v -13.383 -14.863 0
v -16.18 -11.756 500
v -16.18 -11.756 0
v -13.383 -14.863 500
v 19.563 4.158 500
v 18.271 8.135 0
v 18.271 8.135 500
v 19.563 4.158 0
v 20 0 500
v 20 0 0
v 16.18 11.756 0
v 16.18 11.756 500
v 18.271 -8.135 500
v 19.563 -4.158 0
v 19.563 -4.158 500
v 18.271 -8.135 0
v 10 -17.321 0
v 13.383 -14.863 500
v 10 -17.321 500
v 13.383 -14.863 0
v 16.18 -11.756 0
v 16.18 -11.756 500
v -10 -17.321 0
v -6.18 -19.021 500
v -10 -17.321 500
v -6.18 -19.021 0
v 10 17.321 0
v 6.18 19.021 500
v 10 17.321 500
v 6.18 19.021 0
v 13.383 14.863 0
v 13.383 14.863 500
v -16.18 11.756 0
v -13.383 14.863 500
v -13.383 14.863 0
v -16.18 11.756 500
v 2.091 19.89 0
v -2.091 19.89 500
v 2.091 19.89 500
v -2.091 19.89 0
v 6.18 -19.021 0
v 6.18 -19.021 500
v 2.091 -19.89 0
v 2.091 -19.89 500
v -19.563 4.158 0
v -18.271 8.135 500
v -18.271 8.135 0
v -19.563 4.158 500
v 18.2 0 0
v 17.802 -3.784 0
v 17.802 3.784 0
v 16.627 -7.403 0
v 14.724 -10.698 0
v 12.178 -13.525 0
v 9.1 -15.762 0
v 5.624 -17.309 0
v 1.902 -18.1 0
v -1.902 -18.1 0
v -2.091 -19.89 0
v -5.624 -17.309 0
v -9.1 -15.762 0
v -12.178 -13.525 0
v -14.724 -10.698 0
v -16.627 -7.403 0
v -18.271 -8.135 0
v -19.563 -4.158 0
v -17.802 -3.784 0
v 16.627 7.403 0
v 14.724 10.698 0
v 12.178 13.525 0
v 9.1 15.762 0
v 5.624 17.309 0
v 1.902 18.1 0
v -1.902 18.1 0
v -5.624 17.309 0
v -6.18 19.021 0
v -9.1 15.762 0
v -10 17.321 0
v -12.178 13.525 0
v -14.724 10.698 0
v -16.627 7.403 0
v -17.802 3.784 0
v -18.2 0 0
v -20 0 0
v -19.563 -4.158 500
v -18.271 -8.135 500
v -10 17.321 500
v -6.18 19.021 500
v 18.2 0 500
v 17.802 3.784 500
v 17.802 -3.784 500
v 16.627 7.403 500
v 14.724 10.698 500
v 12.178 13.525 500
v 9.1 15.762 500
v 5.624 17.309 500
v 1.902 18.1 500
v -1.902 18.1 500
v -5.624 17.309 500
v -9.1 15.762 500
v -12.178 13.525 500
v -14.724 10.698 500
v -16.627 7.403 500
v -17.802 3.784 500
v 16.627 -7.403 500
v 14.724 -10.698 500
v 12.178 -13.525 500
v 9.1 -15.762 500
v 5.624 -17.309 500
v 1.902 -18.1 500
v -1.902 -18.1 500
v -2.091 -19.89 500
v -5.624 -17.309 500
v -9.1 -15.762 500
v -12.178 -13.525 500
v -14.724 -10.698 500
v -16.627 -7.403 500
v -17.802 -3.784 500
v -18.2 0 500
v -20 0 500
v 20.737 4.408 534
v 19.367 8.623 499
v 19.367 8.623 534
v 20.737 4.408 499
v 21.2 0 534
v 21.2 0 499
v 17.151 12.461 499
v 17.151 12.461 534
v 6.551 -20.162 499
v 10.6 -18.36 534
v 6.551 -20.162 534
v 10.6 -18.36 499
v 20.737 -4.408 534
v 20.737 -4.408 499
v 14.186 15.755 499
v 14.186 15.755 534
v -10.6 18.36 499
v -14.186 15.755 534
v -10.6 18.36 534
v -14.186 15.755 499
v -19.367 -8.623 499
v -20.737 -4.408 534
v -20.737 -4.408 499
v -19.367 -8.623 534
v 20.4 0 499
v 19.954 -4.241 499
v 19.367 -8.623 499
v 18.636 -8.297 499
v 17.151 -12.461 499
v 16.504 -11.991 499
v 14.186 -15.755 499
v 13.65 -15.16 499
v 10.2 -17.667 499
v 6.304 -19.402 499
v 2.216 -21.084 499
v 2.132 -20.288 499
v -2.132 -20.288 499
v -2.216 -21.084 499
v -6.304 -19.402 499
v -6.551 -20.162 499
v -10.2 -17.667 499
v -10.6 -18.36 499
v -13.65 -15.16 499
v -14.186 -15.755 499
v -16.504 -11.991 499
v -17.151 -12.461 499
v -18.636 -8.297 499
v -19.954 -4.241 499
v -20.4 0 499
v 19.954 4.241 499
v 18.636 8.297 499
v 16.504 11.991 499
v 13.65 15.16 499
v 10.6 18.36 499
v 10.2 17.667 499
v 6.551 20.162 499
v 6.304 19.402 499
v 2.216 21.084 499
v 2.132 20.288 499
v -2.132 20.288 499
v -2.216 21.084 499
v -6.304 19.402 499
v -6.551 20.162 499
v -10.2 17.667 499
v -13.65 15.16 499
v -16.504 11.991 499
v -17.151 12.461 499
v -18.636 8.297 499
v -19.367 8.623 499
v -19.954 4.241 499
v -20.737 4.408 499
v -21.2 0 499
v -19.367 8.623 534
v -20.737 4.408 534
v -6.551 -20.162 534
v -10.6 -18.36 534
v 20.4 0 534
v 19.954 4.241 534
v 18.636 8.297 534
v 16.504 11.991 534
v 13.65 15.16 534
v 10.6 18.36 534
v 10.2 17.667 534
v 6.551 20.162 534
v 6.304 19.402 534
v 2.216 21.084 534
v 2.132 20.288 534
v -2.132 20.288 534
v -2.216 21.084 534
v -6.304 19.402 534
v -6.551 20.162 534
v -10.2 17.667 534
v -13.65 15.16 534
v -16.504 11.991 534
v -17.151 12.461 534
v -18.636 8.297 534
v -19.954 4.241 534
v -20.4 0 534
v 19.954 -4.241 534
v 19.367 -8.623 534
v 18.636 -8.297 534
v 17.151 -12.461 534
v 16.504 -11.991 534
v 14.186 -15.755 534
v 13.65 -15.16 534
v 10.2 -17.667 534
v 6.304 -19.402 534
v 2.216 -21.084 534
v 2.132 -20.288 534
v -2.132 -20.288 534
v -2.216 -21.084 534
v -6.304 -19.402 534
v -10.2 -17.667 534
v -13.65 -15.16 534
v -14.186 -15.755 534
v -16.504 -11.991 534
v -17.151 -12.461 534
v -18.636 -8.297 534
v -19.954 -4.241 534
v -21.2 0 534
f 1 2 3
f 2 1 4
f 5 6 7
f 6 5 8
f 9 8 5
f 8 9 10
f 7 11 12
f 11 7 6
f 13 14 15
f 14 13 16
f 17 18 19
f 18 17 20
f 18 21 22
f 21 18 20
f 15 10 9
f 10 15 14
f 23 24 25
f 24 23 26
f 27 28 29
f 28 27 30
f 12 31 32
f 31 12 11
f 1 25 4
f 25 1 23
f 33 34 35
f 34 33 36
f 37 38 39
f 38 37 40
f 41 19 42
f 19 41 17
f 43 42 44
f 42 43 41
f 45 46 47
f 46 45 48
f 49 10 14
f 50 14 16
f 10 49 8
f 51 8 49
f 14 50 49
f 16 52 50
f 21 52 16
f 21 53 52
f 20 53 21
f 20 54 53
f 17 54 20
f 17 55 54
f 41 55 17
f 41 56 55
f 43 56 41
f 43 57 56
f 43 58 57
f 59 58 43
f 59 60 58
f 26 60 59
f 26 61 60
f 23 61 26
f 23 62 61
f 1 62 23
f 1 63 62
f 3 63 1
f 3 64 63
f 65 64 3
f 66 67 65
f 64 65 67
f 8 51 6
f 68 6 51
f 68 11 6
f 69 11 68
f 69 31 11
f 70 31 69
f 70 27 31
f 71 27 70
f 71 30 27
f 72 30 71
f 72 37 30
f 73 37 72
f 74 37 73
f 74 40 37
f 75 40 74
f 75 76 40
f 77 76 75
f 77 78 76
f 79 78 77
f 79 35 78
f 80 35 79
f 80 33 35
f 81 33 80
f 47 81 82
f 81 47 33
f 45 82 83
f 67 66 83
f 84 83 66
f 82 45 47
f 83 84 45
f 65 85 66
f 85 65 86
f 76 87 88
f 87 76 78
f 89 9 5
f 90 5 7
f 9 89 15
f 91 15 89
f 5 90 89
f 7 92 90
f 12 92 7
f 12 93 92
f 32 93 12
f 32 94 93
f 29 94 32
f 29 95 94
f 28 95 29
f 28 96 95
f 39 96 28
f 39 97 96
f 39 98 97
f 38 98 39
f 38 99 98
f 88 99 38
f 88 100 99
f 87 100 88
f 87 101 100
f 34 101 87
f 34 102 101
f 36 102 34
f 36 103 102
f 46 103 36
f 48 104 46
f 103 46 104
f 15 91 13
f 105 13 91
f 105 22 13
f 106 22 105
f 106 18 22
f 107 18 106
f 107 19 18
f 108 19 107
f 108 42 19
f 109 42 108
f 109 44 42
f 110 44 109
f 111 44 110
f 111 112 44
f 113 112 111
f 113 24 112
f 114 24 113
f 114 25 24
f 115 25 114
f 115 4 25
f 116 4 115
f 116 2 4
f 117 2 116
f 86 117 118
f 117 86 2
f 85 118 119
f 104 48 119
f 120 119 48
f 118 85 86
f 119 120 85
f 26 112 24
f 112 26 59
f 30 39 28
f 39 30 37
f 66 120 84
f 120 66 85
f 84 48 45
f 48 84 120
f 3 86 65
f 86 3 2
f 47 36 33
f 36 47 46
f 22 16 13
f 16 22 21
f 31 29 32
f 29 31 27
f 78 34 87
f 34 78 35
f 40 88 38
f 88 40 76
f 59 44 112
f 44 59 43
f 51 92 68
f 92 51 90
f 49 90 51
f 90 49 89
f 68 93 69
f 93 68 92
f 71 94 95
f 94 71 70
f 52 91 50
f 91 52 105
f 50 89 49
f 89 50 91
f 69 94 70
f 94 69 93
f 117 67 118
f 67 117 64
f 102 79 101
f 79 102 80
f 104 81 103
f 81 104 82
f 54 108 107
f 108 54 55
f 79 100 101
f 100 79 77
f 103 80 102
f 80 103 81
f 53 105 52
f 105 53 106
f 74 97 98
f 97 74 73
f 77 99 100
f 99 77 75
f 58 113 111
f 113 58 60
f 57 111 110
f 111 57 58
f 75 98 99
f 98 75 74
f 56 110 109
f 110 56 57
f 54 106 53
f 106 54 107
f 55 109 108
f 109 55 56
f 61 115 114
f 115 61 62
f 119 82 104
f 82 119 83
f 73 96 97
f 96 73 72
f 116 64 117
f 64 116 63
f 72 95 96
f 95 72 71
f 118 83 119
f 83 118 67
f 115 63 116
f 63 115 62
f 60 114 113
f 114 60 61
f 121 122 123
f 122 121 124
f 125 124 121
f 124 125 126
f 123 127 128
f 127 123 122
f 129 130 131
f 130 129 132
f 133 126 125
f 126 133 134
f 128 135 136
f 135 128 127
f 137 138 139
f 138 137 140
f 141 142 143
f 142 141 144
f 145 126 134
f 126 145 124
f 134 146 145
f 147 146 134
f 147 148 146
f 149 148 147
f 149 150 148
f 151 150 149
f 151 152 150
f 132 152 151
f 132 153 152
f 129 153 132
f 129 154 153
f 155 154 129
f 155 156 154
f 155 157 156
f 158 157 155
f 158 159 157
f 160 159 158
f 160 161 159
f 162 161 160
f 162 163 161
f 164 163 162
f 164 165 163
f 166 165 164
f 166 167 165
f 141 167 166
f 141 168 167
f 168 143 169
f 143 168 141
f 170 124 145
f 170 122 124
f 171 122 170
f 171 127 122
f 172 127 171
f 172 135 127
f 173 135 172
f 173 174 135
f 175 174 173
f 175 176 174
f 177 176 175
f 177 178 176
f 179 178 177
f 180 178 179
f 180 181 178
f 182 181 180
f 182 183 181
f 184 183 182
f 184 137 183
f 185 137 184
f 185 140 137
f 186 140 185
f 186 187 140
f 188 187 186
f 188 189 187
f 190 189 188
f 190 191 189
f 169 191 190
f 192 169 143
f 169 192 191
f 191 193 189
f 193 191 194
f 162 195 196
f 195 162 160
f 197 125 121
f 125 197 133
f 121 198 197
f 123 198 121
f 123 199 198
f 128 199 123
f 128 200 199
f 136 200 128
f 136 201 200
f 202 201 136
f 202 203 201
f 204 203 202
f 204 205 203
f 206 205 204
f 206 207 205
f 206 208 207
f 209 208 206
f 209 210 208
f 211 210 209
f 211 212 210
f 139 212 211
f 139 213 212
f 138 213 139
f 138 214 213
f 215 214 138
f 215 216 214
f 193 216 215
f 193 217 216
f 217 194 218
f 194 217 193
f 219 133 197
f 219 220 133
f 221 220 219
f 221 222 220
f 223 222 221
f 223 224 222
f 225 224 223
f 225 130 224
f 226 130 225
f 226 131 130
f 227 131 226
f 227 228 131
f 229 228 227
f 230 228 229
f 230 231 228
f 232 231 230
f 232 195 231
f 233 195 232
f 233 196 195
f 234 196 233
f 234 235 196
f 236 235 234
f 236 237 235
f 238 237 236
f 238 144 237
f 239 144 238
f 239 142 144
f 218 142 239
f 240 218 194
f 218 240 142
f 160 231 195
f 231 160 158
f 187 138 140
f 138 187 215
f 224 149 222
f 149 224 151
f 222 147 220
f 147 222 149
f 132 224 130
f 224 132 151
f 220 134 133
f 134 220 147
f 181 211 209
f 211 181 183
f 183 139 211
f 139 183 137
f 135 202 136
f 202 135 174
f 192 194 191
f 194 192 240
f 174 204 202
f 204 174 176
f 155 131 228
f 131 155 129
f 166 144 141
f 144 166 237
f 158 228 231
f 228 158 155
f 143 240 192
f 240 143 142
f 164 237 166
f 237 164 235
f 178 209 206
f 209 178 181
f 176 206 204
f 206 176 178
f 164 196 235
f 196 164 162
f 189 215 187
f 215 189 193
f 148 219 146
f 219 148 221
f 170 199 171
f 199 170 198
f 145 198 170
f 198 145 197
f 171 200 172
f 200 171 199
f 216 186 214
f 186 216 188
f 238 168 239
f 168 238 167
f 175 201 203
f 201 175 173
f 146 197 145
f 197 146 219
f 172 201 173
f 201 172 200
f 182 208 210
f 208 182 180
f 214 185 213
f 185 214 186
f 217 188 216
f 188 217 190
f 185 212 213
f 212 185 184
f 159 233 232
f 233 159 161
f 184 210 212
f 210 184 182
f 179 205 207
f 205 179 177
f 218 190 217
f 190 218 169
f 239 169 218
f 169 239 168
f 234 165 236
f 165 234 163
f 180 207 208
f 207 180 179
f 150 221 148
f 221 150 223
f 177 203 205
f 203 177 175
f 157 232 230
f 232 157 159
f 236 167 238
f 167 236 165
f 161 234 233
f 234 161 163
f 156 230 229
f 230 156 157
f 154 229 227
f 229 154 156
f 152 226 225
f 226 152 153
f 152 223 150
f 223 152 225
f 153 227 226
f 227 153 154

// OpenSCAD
// Parameters
length_mm = 500; //[250:1000:1]
od_mm = 40; //[30:80:1]
wall_thickness_mm = 1.8; //[0.9:3.6:0.1]
include_end_fitting = 1; //[0:1:1]
fitting_length_mm = 35; //[18:70:1]
fitting_wall_extra_mm = 1.2; //[0.6:2.4:0.1]
fitting_id_clearance_mm = 0.4; //[0.2:1.0:0.1]
overlap_mm = 1; //[0.5:2:0.1]

// HT Pipe Segment - Complete Geometry
module ht_pipe() {
  color([0.85, 0.85, 0.8]) { // PVC color
    // Main pipe segment
    difference() {
      cylinder(h=length_mm, r=od_mm/2, center=false);
      translate([0, 0, -overlap_mm/2])
        cylinder(h=length_mm + overlap_mm, r=od_mm/2 - wall_thickness_mm, center=false);
    }
    
    // End fitting
    if (include_end_fitting) {
      translate([0, 0, length_mm - overlap_mm]) {
        difference() {
          cylinder(h=fitting_length_mm, r=od_mm/2 + fitting_wall_extra_mm, center=false);
          translate([0, 0, -overlap_mm/2])
            cylinder(h=fitting_length_mm + overlap_mm, r=od_mm/2 + fitting_id_clearance_mm, center=false);
        }
      }
    }
  }
}

// Assembly
module assembly() {
  ht_pipe();
}

assembly();
